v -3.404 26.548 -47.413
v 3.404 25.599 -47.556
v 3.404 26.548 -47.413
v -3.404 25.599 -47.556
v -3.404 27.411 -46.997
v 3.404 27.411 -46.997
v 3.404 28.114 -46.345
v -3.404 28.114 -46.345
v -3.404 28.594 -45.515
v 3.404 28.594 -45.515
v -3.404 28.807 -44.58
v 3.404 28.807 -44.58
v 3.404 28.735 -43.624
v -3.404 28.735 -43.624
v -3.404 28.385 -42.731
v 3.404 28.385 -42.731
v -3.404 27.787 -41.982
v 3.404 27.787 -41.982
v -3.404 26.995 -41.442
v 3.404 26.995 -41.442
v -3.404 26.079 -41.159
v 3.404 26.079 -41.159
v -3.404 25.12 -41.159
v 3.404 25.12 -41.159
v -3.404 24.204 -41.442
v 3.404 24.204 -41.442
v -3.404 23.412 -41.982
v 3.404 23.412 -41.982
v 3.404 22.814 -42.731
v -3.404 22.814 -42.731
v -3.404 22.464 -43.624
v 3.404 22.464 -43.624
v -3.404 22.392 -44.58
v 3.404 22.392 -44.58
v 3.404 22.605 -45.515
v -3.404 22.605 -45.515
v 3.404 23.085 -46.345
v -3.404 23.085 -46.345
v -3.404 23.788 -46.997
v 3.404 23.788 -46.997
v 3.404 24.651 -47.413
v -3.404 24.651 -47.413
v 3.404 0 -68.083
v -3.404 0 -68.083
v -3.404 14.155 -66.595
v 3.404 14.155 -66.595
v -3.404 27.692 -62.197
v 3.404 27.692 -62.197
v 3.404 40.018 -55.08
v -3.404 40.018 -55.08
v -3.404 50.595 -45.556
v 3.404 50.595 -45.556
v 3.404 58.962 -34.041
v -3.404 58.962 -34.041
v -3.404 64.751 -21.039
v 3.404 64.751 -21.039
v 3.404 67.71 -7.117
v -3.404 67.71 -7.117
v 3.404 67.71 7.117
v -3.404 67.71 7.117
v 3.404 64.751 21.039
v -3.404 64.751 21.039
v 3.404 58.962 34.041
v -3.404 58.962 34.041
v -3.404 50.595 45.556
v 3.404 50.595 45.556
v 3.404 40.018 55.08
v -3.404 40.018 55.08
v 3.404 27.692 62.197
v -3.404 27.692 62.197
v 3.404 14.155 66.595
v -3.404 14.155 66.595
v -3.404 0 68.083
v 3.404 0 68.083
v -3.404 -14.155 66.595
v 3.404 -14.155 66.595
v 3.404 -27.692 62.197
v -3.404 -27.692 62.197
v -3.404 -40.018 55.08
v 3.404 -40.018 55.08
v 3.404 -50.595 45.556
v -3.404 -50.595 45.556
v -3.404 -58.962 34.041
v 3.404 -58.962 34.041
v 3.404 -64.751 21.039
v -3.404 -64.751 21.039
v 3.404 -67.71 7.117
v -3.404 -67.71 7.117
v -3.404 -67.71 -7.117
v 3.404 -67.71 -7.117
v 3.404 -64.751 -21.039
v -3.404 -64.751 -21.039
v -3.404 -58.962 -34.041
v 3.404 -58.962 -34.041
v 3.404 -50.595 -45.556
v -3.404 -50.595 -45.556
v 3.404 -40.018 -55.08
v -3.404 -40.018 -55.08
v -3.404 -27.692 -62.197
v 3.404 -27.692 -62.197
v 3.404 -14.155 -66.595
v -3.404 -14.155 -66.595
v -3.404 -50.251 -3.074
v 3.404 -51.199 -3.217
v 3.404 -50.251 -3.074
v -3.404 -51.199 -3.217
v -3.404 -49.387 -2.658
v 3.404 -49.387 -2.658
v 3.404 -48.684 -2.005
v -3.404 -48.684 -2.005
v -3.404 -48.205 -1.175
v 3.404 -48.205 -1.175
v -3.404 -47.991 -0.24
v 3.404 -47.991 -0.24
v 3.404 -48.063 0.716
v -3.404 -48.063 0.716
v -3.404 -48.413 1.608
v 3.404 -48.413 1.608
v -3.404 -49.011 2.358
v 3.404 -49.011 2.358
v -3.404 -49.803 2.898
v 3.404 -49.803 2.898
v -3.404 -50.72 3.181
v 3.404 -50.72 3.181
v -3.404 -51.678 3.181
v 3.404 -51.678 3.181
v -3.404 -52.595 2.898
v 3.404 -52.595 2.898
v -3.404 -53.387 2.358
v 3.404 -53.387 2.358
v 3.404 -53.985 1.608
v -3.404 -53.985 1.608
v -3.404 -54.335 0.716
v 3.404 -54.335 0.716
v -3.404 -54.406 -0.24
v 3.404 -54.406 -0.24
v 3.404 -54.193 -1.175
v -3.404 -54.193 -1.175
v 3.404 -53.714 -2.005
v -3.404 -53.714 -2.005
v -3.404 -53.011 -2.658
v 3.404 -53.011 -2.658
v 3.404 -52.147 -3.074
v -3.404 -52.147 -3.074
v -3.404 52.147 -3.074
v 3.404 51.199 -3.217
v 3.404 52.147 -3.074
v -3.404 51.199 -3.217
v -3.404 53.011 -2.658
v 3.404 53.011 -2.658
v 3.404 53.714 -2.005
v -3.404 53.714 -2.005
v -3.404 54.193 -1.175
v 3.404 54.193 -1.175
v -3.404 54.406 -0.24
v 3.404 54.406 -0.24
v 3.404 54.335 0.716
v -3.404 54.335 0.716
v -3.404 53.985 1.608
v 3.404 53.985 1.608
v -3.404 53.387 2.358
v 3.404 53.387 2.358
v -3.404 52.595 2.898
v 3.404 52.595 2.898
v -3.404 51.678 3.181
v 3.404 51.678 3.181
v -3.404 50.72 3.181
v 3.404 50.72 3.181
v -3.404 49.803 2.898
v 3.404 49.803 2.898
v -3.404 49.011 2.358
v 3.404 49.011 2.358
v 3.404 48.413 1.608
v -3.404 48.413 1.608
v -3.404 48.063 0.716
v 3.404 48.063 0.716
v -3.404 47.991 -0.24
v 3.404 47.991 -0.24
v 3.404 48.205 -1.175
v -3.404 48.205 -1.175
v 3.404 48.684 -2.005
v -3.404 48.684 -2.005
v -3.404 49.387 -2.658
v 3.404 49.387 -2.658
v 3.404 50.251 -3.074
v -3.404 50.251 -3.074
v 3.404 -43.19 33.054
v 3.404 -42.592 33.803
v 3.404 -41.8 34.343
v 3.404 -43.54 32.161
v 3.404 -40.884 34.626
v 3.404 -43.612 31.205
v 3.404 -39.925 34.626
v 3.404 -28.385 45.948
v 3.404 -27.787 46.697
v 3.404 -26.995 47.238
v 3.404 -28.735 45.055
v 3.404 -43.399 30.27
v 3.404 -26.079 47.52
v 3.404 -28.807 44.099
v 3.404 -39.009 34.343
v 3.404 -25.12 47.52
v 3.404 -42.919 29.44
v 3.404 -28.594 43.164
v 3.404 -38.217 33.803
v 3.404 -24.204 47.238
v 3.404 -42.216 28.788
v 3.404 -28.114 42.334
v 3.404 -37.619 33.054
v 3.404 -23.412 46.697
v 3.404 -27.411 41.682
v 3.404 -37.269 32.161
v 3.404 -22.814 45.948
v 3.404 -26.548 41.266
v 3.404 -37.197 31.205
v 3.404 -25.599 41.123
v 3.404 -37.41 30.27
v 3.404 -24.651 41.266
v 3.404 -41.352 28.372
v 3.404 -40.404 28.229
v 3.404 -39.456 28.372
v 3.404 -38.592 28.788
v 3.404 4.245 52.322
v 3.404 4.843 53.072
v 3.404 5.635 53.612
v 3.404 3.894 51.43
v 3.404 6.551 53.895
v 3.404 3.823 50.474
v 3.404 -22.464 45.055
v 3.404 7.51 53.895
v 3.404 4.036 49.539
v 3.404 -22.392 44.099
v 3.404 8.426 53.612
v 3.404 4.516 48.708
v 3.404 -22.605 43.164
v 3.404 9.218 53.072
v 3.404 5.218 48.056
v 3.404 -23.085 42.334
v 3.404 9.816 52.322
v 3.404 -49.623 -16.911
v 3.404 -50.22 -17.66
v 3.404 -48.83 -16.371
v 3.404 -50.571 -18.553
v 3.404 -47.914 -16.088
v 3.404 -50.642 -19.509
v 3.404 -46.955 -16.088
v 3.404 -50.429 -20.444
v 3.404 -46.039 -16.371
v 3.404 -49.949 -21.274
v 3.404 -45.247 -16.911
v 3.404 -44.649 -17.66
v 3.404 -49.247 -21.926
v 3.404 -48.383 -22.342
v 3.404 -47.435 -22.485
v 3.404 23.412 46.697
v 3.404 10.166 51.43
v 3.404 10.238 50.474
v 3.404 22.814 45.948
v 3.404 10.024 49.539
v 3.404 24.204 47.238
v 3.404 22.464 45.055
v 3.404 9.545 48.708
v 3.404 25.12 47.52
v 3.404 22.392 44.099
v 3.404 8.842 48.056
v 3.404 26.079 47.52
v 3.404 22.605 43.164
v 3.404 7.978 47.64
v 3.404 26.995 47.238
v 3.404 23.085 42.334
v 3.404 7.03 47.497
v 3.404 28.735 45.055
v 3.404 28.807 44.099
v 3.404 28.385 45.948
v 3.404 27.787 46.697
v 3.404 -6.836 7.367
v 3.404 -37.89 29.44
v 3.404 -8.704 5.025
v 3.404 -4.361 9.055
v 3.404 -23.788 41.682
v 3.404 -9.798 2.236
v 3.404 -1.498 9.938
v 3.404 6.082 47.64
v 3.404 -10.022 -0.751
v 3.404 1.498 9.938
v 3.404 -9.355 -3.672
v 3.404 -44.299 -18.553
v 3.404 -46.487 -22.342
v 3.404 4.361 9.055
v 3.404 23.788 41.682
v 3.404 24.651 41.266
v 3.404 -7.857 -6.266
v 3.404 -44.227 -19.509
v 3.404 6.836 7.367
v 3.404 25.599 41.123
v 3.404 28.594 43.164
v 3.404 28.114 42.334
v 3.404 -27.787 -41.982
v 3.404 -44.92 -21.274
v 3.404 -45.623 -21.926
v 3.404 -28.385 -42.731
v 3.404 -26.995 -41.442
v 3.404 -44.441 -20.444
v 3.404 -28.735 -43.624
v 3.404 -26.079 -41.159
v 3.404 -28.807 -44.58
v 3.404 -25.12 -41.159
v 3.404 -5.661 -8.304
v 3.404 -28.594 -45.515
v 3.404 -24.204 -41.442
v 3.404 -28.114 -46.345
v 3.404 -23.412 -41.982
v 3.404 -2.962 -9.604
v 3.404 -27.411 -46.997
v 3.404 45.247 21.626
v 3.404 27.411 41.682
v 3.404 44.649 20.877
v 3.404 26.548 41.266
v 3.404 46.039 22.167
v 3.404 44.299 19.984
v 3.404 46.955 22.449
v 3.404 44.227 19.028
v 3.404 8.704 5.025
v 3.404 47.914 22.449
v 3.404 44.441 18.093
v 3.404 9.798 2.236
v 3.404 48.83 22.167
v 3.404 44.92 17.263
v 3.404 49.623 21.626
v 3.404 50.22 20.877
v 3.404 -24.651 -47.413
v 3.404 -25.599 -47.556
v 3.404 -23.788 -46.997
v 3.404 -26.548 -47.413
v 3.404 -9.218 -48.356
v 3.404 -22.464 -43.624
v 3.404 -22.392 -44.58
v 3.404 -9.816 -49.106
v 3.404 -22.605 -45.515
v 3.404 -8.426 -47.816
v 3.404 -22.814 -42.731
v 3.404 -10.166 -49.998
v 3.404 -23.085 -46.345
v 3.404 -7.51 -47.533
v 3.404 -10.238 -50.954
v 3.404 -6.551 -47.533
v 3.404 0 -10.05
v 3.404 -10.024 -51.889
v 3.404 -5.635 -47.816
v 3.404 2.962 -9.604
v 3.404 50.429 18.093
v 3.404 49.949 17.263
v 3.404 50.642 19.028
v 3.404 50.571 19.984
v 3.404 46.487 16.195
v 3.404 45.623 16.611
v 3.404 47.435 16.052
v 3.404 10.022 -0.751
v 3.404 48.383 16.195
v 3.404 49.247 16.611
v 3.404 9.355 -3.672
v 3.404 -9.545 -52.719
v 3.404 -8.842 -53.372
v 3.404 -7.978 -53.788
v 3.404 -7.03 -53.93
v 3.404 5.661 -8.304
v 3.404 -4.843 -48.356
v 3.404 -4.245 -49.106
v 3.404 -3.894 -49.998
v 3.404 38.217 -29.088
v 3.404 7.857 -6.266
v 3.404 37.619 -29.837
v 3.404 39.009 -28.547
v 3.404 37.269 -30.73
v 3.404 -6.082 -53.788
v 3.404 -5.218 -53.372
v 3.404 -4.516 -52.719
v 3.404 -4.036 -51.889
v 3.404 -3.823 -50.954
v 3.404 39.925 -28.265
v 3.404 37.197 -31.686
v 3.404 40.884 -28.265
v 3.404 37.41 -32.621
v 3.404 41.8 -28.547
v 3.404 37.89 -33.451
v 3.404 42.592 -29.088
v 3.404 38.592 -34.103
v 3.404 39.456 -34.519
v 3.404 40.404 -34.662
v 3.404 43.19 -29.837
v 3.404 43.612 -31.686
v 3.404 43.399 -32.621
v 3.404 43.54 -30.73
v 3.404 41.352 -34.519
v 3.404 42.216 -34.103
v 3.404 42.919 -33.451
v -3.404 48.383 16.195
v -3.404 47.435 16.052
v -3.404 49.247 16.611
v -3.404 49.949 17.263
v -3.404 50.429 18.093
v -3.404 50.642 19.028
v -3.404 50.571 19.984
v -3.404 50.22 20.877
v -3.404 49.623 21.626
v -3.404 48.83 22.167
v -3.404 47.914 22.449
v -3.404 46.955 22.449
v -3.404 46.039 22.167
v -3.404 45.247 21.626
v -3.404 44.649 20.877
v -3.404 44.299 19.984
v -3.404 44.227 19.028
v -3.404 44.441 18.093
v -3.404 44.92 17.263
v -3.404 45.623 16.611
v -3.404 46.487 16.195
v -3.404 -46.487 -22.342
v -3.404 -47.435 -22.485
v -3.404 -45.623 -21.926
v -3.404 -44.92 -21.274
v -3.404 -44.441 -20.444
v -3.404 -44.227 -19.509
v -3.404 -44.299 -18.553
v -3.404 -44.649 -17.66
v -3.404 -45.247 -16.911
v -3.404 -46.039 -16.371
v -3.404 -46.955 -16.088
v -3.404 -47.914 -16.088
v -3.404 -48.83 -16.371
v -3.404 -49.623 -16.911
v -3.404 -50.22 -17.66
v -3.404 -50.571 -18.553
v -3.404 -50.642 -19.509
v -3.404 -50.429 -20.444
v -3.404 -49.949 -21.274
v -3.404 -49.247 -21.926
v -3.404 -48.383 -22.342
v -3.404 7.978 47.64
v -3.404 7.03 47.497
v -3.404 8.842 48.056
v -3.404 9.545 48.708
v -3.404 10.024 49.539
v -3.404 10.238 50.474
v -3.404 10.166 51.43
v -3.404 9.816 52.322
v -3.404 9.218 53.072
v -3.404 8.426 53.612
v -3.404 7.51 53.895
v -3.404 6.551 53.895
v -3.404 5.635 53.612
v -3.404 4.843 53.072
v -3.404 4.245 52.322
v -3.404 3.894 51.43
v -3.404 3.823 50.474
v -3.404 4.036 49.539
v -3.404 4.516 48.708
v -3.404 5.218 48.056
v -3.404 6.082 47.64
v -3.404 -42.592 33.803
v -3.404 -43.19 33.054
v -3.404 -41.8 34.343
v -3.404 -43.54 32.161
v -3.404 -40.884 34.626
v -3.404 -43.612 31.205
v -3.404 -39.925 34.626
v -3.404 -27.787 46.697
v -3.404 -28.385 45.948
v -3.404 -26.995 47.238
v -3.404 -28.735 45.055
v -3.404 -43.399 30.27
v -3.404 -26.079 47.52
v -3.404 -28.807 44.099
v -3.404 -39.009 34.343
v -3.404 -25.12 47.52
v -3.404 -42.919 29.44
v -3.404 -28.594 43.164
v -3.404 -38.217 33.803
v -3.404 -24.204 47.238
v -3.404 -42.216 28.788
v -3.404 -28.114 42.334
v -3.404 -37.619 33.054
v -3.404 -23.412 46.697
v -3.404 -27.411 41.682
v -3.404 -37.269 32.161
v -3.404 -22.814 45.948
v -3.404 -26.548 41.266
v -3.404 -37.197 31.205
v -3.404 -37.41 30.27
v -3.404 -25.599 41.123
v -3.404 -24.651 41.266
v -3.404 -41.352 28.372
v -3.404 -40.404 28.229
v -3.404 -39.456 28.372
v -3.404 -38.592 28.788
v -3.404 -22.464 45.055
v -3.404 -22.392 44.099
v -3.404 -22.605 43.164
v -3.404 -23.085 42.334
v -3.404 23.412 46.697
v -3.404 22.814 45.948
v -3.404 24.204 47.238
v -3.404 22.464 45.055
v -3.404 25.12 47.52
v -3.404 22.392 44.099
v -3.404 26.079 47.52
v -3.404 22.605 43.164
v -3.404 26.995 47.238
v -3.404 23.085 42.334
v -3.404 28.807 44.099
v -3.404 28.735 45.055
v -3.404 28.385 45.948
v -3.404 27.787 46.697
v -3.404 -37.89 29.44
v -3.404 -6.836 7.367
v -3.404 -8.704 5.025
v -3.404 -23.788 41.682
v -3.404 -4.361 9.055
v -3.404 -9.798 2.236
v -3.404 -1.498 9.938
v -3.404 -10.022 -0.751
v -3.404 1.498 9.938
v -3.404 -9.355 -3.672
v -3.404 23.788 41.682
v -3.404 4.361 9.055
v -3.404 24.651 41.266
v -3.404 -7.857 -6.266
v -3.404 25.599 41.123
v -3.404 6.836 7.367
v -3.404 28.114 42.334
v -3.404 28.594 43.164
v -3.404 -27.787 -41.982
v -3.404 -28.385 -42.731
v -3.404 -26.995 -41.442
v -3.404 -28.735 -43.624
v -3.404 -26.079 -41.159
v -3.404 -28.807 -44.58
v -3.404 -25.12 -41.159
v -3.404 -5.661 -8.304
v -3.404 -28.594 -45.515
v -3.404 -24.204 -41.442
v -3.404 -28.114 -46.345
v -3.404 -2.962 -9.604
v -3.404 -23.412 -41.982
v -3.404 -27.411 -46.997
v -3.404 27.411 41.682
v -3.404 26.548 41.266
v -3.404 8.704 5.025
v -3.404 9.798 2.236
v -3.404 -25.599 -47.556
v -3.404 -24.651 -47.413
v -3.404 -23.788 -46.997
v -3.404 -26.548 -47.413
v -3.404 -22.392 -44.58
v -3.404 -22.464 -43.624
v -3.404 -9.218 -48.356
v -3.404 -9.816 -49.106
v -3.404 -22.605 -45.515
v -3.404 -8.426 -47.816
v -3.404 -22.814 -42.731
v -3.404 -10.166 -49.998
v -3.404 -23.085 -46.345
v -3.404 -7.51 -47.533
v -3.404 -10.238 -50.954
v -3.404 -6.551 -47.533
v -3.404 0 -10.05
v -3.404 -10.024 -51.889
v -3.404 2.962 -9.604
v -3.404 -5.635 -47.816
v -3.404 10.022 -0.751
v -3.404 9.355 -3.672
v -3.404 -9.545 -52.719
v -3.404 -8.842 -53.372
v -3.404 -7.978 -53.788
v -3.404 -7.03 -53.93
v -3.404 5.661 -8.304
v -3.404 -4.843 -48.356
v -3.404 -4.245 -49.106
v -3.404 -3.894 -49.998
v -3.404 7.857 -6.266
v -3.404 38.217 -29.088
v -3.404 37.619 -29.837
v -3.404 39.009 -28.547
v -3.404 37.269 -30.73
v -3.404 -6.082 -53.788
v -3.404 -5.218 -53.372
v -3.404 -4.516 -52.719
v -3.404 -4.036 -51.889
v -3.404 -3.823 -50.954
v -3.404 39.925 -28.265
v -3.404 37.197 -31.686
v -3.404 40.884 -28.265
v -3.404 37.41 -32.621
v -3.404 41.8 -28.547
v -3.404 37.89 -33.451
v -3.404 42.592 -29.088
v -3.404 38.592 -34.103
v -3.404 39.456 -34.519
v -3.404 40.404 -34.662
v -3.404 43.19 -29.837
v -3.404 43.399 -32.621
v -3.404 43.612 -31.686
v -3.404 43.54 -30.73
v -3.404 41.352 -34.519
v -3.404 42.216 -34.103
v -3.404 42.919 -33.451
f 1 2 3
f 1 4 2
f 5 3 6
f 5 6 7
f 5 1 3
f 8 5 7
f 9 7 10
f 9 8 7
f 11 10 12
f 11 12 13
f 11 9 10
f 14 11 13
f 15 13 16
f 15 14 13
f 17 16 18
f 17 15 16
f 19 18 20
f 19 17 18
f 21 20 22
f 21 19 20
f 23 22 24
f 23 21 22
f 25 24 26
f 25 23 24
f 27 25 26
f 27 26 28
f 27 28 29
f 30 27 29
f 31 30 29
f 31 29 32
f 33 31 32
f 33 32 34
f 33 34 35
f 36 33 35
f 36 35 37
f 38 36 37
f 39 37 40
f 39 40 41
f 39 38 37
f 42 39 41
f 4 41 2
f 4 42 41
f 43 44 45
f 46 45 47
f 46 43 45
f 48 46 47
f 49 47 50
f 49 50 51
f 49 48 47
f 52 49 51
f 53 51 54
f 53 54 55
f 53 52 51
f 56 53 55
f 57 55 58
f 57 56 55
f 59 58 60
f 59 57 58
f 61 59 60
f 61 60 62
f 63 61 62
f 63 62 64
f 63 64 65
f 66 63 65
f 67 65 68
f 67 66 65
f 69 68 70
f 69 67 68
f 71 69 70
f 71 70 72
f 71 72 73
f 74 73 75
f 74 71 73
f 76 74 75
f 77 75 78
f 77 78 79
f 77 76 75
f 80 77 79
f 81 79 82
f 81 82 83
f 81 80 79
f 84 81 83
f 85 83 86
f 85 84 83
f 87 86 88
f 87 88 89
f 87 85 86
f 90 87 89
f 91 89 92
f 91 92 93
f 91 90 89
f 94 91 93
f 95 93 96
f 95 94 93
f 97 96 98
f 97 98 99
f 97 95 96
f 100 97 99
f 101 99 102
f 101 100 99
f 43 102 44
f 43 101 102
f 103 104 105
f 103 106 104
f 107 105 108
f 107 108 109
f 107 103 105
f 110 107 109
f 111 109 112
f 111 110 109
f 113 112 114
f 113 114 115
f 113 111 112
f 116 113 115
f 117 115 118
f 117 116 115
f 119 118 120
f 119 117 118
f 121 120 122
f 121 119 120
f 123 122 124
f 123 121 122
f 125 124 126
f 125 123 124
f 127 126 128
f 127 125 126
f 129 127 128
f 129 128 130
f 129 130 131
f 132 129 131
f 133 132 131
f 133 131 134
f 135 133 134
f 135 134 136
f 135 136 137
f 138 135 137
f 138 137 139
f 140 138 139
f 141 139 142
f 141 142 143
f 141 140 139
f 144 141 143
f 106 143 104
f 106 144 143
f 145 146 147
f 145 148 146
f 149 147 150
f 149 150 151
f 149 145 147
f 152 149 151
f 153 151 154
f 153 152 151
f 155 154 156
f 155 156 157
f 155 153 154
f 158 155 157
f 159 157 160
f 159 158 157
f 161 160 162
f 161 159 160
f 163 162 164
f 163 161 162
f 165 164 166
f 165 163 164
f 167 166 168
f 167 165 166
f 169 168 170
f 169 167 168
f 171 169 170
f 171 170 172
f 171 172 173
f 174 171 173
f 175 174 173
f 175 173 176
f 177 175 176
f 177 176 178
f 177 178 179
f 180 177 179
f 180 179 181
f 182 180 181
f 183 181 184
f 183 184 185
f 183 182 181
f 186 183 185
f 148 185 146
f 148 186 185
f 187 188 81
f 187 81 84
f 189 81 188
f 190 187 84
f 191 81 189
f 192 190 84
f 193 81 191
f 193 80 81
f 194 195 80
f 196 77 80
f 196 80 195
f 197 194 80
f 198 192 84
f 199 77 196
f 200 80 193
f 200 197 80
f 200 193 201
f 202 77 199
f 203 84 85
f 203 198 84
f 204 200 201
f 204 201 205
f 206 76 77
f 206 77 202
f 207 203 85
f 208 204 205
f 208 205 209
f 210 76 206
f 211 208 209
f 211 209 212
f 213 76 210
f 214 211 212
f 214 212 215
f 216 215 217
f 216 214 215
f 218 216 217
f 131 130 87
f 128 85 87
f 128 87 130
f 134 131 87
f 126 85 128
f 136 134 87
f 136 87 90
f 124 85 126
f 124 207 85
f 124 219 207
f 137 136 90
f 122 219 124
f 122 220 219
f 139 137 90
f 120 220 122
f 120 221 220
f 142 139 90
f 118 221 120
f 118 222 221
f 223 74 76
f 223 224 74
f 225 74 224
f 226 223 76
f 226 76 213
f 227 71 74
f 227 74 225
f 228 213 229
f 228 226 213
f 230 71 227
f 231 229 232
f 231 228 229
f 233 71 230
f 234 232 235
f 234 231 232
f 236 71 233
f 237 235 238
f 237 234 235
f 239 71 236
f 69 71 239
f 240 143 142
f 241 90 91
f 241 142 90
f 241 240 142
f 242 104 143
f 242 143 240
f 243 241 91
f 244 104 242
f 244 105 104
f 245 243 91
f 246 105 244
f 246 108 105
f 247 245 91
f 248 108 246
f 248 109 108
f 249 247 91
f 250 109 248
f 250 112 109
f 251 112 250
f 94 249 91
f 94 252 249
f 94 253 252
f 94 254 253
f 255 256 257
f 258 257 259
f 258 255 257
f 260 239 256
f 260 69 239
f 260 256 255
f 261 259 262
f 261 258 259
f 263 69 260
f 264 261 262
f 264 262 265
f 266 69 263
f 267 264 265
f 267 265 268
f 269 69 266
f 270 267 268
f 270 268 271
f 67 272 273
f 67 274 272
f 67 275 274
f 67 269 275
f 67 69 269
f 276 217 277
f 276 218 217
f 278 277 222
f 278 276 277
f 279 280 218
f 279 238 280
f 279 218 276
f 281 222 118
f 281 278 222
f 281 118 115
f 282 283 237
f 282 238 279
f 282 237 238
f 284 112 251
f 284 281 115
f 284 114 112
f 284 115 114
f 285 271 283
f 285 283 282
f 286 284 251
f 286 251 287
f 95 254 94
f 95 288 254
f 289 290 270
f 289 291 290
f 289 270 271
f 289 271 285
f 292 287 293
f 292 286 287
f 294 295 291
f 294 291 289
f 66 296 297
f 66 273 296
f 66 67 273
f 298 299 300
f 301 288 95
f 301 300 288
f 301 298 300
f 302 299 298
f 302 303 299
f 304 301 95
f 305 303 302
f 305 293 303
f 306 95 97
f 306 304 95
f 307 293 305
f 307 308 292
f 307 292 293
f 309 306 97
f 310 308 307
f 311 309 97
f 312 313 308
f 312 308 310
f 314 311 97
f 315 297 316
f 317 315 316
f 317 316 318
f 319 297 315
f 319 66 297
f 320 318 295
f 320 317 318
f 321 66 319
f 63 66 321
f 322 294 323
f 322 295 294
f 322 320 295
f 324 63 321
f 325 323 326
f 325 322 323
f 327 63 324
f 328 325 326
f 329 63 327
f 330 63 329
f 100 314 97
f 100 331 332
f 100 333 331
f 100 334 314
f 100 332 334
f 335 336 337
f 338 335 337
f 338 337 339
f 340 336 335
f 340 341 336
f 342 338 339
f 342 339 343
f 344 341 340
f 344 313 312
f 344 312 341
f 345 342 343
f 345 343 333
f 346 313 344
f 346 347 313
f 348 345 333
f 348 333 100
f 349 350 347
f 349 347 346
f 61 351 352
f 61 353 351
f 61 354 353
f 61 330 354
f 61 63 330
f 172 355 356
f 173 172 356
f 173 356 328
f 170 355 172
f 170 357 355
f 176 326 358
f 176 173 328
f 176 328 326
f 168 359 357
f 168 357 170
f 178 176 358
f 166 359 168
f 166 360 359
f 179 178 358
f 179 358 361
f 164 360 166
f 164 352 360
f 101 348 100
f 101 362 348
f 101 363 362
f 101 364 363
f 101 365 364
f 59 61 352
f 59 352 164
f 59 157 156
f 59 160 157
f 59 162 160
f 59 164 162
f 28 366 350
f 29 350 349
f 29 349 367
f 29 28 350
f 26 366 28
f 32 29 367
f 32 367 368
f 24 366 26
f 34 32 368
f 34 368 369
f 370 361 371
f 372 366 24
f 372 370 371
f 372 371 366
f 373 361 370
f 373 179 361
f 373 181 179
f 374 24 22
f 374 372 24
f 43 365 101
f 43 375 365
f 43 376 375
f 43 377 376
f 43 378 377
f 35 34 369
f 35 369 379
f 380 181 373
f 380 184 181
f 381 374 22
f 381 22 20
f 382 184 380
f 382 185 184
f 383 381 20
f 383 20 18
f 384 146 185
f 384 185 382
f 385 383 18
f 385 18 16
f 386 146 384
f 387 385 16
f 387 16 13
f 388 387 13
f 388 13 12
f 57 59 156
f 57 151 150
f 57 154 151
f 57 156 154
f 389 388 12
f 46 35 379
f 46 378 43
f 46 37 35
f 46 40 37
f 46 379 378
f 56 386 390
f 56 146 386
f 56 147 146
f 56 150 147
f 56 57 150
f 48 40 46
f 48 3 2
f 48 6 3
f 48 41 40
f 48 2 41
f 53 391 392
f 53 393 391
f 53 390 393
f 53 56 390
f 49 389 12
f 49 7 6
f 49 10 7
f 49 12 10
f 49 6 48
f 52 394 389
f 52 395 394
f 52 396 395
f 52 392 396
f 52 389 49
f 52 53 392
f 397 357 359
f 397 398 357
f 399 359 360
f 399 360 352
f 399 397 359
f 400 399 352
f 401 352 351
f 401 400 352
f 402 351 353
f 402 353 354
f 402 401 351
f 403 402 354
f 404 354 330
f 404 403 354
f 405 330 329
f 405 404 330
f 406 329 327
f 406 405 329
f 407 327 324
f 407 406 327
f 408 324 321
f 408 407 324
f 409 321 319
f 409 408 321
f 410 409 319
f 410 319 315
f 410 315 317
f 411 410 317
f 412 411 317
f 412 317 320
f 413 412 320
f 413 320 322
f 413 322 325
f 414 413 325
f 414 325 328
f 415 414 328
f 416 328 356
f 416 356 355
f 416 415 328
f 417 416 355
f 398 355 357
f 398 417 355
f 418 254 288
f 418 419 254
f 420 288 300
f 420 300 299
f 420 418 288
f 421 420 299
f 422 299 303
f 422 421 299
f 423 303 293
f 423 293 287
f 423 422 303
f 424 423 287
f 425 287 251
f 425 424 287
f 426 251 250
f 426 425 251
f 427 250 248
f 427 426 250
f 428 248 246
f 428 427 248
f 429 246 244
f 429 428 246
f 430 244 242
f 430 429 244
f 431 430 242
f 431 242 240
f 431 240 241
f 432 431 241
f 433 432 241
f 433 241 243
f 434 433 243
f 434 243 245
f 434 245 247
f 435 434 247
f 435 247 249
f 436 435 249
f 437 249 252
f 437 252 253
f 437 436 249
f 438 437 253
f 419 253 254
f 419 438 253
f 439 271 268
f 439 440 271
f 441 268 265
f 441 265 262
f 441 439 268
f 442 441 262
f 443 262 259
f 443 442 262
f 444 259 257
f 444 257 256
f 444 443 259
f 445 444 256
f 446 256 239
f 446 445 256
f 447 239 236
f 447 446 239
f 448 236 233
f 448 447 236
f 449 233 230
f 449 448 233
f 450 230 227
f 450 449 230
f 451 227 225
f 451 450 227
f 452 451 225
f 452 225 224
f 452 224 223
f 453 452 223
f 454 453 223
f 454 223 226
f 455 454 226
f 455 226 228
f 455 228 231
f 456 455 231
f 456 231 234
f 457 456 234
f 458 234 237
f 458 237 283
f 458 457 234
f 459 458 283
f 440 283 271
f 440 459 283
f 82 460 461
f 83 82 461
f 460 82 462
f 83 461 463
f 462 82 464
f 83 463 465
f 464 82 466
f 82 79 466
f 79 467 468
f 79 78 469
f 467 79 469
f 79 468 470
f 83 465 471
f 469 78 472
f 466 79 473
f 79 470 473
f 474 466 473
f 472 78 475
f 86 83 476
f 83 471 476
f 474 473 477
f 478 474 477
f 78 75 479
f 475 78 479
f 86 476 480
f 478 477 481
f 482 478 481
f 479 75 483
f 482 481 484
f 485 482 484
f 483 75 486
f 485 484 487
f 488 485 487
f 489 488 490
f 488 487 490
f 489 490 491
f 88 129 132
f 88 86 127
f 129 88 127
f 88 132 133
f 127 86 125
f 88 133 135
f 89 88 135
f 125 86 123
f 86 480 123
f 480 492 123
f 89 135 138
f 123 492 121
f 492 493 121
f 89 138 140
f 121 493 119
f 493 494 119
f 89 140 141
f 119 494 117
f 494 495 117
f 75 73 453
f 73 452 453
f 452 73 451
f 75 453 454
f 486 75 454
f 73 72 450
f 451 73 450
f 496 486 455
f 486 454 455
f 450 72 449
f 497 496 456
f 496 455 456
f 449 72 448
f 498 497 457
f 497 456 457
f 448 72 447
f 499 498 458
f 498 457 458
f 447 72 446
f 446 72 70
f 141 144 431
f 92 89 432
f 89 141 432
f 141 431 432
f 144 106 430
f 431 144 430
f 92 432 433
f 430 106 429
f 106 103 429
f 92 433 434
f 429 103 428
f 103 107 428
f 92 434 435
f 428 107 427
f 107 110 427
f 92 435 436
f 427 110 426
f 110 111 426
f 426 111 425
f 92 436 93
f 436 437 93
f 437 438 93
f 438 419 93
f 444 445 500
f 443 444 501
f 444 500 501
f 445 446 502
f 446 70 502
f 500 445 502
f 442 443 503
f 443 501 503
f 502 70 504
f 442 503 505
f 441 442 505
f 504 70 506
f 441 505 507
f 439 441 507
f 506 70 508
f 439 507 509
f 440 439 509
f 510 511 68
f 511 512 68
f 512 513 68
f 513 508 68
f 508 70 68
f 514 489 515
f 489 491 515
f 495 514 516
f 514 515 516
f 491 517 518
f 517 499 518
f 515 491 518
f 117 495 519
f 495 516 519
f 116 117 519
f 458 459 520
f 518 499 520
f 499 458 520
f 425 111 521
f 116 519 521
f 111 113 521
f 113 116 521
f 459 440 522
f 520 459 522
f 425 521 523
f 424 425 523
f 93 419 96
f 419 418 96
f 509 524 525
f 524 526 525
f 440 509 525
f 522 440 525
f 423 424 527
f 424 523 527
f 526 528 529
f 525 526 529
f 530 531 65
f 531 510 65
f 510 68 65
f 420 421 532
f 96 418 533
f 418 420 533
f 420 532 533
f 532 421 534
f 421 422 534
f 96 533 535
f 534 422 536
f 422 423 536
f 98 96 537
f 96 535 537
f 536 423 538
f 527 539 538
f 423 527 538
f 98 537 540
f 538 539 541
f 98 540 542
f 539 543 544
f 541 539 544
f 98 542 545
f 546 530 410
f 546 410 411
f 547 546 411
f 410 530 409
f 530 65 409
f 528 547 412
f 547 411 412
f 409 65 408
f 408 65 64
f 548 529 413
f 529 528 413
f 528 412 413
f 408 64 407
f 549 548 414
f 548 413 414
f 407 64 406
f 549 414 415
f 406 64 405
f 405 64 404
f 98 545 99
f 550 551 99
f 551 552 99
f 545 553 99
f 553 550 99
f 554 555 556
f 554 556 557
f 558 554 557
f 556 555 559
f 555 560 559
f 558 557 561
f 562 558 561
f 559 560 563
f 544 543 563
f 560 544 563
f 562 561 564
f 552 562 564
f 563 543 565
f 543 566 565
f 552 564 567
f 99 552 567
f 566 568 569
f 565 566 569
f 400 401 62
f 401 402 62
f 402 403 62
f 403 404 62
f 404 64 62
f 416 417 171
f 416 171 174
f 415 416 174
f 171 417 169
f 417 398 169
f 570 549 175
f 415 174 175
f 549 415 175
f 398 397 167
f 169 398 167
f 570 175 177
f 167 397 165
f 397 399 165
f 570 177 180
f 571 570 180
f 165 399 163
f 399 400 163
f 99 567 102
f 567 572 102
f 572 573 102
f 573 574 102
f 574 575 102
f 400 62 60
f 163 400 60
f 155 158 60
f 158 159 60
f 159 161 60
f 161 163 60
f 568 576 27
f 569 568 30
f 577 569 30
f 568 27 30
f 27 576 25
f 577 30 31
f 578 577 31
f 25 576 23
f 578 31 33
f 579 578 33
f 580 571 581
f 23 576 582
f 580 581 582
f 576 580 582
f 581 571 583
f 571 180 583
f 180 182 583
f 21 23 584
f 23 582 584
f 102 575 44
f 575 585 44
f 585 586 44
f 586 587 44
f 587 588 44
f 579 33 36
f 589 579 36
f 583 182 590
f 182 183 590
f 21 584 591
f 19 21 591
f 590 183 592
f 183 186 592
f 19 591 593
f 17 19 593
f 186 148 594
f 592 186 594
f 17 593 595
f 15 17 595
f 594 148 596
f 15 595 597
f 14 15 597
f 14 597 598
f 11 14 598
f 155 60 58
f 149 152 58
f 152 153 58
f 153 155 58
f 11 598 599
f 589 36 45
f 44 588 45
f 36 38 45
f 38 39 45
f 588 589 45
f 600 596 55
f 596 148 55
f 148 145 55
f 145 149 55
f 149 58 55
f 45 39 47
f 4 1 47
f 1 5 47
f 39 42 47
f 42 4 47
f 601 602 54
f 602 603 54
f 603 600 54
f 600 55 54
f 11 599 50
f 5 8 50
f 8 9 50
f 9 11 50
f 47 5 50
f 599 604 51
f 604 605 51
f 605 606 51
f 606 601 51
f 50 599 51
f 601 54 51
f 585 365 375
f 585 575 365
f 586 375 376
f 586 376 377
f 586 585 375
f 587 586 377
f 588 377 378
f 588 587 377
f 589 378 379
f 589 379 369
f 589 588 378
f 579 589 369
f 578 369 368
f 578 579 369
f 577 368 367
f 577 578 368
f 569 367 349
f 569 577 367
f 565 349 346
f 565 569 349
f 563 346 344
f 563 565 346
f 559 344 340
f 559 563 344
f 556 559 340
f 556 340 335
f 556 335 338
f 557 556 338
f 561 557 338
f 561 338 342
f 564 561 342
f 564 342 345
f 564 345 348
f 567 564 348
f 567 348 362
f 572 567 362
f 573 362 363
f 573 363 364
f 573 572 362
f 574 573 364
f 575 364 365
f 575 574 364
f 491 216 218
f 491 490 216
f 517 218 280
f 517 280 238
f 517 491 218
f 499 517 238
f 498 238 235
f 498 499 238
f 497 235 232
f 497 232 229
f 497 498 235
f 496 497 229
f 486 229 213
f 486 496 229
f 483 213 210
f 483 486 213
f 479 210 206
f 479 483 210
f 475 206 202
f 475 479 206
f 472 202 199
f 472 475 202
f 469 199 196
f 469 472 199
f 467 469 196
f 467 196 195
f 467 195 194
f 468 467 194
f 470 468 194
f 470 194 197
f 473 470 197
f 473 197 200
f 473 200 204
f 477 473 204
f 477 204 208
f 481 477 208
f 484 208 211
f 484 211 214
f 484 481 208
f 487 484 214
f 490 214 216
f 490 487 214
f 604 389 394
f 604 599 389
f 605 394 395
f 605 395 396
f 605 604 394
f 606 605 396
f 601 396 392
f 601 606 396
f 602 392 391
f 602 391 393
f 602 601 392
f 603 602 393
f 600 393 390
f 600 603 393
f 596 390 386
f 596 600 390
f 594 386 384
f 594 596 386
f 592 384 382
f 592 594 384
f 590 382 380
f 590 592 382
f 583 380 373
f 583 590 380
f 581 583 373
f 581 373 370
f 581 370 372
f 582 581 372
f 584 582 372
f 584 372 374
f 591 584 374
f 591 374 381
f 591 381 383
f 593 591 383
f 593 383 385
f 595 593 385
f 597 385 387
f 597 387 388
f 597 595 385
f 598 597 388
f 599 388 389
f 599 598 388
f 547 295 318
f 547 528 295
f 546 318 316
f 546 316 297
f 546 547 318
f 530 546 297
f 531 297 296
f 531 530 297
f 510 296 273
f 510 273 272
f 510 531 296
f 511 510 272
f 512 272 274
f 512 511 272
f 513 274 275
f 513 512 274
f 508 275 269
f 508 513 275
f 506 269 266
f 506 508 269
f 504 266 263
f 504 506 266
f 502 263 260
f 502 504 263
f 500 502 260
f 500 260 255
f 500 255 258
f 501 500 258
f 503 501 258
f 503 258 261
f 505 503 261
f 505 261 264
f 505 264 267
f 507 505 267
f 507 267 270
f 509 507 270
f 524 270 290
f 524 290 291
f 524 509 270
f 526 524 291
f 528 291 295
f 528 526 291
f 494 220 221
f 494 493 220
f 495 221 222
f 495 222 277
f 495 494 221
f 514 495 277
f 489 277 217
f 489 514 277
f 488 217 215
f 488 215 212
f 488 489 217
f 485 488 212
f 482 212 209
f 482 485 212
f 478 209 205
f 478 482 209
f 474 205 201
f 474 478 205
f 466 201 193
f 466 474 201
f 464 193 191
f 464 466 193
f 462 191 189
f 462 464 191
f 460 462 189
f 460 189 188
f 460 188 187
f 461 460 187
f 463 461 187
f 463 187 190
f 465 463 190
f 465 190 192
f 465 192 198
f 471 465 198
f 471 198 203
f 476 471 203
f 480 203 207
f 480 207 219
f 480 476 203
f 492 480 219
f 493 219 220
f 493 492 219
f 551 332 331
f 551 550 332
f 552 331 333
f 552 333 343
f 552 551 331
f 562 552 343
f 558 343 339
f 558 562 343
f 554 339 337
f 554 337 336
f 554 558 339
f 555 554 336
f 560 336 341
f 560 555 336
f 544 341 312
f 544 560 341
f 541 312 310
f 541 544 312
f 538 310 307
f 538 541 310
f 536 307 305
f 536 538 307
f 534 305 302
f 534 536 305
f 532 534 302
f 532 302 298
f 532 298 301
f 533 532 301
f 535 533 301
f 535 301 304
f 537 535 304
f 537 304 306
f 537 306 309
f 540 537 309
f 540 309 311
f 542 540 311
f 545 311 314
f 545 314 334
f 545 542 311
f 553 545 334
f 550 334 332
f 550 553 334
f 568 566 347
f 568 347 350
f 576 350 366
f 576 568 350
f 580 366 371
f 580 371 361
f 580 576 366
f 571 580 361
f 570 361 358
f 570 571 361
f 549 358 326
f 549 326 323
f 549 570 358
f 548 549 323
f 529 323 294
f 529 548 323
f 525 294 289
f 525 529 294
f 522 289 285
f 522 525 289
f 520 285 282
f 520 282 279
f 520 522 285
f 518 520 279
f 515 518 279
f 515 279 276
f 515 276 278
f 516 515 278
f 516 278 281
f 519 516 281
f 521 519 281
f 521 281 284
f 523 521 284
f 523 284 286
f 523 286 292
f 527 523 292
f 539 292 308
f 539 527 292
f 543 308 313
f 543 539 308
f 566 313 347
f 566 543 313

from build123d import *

# Parameters (mm, degrees)
SKETCH2_R           = 127
SKETCH2_R_2         = 6
SKETCH2_R_3         = 31.75
BOSS_EXTRUDE1_DEPTH = 6.35
SCALE1_SCALE        = 0.714781685
SCALE2_SCALE        = 0.5
BOSS_EXTRUDE2_START = -4.538863701
SKETCH3_R           = 11.347159253
SKETCH3_R_2         = 10.05
BOSS_EXTRUDE2_DEPTH = 4.538863701
SCALE3_SCALE        = 1.5
BOSS_EXTRUDE3_START = -6.808295552
SKETCH4_R           = 15.075
SKETCH4_R_2         = 10.05
BOSS_EXTRUDE3_DEPTH = 6.808295552


with BuildPart() as part:
    # Sketch2 → Boss-Extrude1 (new, symmetric)
    with BuildSketch(Plane(origin=(0, 0, 0), x_dir=(0, 0, -1), z_dir=(1, 0, 0))):
        Circle(SKETCH2_R)
        with Locations((-82.709756188, 47.7525)):
            Circle(SKETCH2_R_2, mode=Mode.SUBTRACT)
        with Locations((-35.943005468, 88.483362181)):
            Circle(SKETCH2_R_2, mode=Mode.SUBTRACT)
        with Locations((-82.709756188, -47.7525)):
            Circle(SKETCH2_R_2, mode=Mode.SUBTRACT)
        with Locations((-94.600342195, 13.114125267)):
            Circle(SKETCH2_R_2, mode=Mode.SUBTRACT)
        with Locations((0, -95.505)):
            Circle(SKETCH2_R_2, mode=Mode.SUBTRACT)
        with Locations((-58.657336727, -75.369236914)):
            Circle(SKETCH2_R_2, mode=Mode.SUBTRACT)
        with Locations((82.709756188, -47.7525)):
            Circle(SKETCH2_R_2, mode=Mode.SUBTRACT)
        with Locations((35.943005468, -88.483362181)):
            Circle(SKETCH2_R_2, mode=Mode.SUBTRACT)
        with Locations((82.709756188, 47.7525)):
            Circle(SKETCH2_R_2, mode=Mode.SUBTRACT)
        with Locations((94.600342195, -13.114125267)):
            Circle(SKETCH2_R_2, mode=Mode.SUBTRACT)
        with Locations((58.657336727, 75.369236914)):
            Circle(SKETCH2_R_2, mode=Mode.SUBTRACT)
        with Locations((0, 95.505)):
            Circle(SKETCH2_R_2, mode=Mode.SUBTRACT)
        Circle(SKETCH2_R_3, mode=Mode.SUBTRACT)
    extrude(amount=BOSS_EXTRUDE1_DEPTH, both=True)


with BuildPart() as part_1:
    # Scale1: scaled about (0, 0, 0)
    add(part.part.scale(SCALE1_SCALE))


with BuildPart() as part_2:
    # Scale2: scaled about (0, 0, 0)
    add(part_1.part.scale(SCALE2_SCALE))

    # Sketch3 → Boss-Extrude2 (add)
    with BuildSketch(Plane(origin=(2.269431851, 0, 0), x_dir=(0, 0, -1), z_dir=(1, 0, 0)).offset(BOSS_EXTRUDE2_START)):
        Circle(SKETCH3_R)
        Circle(SKETCH3_R_2, mode=Mode.SUBTRACT)
    extrude(amount=BOSS_EXTRUDE2_DEPTH)


with BuildPart() as part_3:
    # Scale3: scaled about (0, 0, 0)
    add(part_2.part.scale(SCALE3_SCALE))

    # Sketch4 → Boss-Extrude3 (add)
    with BuildSketch(Plane(origin=(3.404147776, 0, 0), x_dir=(0, 0, -1), z_dir=(1, 0, 0)).offset(BOSS_EXTRUDE3_START)):
        Circle(SKETCH4_R)
        Circle(SKETCH4_R_2, mode=Mode.SUBTRACT)
    extrude(amount=BOSS_EXTRUDE3_DEPTH)


solid = part_3.part
